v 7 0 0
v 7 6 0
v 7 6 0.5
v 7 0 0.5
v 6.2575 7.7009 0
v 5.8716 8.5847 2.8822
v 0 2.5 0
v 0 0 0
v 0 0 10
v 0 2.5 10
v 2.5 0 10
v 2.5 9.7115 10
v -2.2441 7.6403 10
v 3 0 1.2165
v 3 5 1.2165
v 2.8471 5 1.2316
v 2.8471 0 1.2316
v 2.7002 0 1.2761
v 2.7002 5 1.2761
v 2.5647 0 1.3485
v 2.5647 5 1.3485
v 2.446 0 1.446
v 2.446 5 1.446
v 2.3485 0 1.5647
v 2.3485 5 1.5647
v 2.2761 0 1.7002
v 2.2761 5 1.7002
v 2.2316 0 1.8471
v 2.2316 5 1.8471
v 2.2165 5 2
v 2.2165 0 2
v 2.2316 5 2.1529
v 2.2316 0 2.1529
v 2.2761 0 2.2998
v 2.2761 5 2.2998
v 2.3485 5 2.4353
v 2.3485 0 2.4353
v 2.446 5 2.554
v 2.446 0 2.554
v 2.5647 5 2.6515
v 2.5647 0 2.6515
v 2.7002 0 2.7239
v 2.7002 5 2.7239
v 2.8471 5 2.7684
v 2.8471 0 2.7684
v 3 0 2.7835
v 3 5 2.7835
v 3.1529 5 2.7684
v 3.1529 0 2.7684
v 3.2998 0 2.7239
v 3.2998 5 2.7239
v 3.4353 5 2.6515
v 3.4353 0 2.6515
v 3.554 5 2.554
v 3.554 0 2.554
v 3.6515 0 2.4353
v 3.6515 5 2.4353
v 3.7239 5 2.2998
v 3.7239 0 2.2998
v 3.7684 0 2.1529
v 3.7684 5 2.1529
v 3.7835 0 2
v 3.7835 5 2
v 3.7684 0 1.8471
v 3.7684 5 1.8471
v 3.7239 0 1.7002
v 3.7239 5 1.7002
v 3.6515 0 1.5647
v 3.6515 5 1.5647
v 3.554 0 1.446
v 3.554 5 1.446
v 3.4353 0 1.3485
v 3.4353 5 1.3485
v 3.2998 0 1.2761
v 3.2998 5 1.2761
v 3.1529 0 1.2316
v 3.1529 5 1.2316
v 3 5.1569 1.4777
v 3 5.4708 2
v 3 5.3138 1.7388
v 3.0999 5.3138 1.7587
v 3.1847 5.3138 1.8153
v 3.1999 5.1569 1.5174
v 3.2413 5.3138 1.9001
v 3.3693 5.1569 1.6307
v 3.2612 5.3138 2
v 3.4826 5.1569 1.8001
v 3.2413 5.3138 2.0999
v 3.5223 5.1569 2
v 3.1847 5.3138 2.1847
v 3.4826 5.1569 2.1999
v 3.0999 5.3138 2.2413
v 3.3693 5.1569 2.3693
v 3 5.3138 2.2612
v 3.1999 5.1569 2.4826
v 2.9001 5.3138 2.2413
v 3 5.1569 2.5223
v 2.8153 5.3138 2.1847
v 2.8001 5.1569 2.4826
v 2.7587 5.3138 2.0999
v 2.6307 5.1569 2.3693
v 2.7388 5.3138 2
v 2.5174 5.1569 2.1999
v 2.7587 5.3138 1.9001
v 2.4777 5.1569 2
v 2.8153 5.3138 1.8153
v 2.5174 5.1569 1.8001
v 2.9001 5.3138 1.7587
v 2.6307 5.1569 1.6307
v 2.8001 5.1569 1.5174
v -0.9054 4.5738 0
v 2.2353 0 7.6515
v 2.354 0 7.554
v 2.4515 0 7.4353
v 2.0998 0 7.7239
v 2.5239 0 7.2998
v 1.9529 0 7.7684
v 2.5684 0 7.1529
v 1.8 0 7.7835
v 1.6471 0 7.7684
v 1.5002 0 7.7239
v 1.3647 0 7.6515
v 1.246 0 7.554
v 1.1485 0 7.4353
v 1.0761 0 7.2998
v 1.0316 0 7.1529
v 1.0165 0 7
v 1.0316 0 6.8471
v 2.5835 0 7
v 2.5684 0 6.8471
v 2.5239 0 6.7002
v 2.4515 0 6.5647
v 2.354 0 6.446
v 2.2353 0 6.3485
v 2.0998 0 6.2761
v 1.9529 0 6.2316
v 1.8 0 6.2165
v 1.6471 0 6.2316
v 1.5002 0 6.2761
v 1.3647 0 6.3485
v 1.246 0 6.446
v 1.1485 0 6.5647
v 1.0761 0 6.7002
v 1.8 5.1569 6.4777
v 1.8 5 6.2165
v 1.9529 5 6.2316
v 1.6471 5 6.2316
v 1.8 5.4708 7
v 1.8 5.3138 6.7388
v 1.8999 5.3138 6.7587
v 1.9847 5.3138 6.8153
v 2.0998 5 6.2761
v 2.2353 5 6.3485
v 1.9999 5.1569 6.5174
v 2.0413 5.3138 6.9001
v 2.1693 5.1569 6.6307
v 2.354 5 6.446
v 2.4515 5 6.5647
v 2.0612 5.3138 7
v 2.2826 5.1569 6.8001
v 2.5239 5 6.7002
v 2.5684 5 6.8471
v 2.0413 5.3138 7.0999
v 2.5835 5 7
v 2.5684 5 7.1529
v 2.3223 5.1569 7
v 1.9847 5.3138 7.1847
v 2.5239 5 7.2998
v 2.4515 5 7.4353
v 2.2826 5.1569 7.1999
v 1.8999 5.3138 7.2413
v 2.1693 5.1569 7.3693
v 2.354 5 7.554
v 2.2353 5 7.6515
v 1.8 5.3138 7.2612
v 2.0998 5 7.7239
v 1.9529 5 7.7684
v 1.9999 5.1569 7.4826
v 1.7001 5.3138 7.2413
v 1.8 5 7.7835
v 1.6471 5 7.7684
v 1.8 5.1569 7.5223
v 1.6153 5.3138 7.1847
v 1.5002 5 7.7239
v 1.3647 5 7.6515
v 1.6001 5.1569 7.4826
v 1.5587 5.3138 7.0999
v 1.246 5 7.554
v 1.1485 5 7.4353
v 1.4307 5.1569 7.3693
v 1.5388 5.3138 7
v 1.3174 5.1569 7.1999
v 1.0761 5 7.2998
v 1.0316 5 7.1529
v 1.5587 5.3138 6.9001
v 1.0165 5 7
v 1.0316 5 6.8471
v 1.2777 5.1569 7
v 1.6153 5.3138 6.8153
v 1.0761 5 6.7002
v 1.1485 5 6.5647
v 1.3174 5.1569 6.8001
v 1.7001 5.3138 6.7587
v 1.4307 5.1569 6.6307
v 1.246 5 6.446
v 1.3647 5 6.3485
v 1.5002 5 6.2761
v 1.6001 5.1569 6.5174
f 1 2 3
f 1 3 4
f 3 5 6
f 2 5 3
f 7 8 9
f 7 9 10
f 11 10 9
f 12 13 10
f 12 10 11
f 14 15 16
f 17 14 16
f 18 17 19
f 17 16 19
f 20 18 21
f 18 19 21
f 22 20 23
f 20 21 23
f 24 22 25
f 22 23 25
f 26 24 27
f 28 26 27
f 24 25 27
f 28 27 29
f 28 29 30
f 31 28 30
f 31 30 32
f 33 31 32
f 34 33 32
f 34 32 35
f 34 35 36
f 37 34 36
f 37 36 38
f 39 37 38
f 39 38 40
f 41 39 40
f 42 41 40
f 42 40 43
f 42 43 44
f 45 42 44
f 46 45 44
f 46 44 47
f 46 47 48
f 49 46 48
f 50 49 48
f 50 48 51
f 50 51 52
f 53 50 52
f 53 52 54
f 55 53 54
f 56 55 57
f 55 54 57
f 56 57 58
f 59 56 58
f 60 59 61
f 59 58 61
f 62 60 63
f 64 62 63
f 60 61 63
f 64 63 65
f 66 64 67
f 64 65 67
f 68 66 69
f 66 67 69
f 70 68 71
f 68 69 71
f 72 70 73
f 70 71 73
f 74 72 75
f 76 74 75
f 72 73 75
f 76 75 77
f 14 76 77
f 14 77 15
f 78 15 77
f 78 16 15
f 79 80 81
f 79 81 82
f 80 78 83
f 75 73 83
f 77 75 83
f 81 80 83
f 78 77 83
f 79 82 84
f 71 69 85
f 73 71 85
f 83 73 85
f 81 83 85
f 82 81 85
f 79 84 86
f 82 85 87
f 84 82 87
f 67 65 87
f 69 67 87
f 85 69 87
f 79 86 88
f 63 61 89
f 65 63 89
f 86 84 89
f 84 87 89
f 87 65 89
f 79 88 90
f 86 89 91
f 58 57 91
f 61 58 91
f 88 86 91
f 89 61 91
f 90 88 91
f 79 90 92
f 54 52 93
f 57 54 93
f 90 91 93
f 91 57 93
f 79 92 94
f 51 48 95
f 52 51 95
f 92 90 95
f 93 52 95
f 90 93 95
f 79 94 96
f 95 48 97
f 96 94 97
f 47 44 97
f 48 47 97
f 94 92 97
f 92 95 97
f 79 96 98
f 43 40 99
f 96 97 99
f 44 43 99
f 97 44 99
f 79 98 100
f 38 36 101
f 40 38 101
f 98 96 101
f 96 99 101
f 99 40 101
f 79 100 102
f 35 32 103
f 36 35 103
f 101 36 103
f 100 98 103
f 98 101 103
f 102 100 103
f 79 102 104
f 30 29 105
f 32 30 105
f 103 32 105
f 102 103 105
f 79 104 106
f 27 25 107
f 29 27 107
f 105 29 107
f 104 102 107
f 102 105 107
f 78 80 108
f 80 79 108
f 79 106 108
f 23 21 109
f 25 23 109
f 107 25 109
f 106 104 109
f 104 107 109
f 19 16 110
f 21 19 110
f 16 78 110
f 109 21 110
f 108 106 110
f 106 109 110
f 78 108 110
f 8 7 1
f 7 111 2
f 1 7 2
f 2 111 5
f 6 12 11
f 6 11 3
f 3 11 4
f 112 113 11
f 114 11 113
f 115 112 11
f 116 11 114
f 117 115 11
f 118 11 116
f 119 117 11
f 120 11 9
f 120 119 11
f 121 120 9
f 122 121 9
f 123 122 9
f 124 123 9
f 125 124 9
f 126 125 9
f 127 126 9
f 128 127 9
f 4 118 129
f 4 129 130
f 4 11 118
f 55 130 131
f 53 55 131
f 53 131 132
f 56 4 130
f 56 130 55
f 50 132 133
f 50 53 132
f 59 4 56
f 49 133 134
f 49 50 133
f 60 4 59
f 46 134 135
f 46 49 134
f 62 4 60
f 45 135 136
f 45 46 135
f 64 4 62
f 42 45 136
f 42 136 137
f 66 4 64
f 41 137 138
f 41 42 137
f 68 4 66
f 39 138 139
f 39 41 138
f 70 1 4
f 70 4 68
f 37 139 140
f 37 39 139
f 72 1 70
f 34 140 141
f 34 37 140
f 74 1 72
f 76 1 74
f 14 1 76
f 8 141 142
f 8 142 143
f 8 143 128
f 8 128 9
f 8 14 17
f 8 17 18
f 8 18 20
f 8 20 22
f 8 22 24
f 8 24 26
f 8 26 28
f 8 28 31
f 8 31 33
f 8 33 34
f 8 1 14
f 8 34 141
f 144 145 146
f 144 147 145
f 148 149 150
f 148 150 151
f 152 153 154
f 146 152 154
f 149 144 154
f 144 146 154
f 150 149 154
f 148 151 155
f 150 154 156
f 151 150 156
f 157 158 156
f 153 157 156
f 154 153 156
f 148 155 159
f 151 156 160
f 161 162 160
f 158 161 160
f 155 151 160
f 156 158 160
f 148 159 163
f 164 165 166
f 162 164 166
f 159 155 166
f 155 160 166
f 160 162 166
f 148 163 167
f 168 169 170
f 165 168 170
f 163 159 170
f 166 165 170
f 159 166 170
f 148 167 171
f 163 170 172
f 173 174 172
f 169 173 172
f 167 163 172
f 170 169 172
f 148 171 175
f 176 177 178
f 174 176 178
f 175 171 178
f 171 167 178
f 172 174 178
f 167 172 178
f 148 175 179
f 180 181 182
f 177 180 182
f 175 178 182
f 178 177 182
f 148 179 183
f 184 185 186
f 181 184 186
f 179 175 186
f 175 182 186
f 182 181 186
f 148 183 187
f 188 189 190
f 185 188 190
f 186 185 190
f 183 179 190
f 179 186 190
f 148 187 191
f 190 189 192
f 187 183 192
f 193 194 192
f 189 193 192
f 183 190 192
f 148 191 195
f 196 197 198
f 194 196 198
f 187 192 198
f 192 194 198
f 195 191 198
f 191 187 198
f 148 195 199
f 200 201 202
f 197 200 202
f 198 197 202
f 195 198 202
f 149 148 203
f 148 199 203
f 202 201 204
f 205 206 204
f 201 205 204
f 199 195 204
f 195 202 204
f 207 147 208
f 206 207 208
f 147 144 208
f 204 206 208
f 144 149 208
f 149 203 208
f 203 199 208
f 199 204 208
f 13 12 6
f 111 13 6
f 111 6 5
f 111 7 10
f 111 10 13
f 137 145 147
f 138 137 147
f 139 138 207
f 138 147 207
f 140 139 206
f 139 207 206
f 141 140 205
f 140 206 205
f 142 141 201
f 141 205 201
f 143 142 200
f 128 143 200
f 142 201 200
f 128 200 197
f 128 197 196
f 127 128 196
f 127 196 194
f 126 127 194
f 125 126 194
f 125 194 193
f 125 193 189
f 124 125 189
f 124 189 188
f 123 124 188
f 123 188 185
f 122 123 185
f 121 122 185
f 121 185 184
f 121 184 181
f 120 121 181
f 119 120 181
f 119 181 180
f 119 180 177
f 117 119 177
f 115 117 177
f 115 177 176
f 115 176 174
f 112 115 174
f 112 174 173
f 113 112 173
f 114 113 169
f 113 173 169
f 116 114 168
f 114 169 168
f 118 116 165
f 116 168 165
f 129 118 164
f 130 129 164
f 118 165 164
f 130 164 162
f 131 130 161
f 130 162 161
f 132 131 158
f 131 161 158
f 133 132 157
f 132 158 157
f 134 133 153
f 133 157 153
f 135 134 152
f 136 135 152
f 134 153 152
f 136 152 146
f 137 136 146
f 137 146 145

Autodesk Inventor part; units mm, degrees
ref_plane "YZ Plane" through (0, 0, 0) normal (1, 0, 0) x (0, 1, 0)
ref_plane "XZ Plane" through (0, 0, 0) normal (0, 1, 0) x (-1, 0, 0)
ref_plane "XY Plane" through (0, 0, 0) normal (0, 0, 1) x (1, 0, 0)
sketch "Sketch1" plane through (0, 0, 0) normal (0, 0, 1) x (1, 0, 0)
  line L0 (0, 0) -> (0, 2.5)
  line L1 (0, 2.5) -> (-2.2441, 7.6403)
  line L2 (-2.2441, 7.6403) -> (4.9187, 10.7674)
  line L3 (4.9187, 10.7674) -> (7, 6)
  line L4 (7, 6) -> (7, 0)
  line L5 (7, 0) -> (0, 0)
  dimension "d5" = 23.584
  dimension "d6" = 2.5
  dimension "d7" = 7
  dimension "d9" = 6
  dimension "d14" = 7.9
extrude "Extrusion1" add sketch "Sketch1" along normal blind 10
sketch "Sketch2" plane through (6.9048, 6.218, 0) normal (-0.916472, -0.4000988, 0) x (0, 0, 1)
  line L0 (0, 4.964) -> (10, 4.964) projected
  line L1 (10, 4.964) -> (10, -0.6448) projected
  line L2 (10, 4.964) -> (0, 1.618)
  line L3 (0, 1.618) -> (0, 4.964)
  point P0 (0, -2.936)
  dimension "d2" = 18.5
extrude "Extrusion2" cut sketch "Sketch2" along normal through all both and the other way through all
sketch "Sketch3" plane through (0, 0, 0) normal (0, -1, 0) x (1, 0, 0)
  line L0 (7, 0) -> (0, 0) projected
  line L1 (7, 0) -> (7, 10) projected
  line L2 (0, 10) -> (7, 10) projected
  line L3 (0, 0) -> (0, 10) projected
  line L4 (2.5, 10) -> (7, 0.5)
  dimension "d12" = 2.5
  dimension "d13" = 0.5
extrude "Extrusion3" cut sketch "Sketch3" against normal through all contours L4 L2 L1
sketch "Sketch4" plane through (0, 0, 0) normal (0, -1, 0) x (1, 0, 0)
  point P0 (0, 0)
  point P1 (3, 2)
  point P2 (1.8, 7)
  dimension "d22" = 3
  dimension "d23" = 2
  dimension "d24" = 7
  dimension "d25" = 1.8
hole "Hole1" at (3, 0, 2) at (1.8, 0, 7) direction (0, 1, 0) diameter 1.567 depth 5 tip angle 118 thread size "M2x0.4" class "6H" standard "ANSI Metric M Profile"
equation "\"d5\" = thumb_axis_beta_local"
equation "\"thumb_axis_beta_local\" = thumb_axis_beta"
properties part number "CMC extension endstop"
